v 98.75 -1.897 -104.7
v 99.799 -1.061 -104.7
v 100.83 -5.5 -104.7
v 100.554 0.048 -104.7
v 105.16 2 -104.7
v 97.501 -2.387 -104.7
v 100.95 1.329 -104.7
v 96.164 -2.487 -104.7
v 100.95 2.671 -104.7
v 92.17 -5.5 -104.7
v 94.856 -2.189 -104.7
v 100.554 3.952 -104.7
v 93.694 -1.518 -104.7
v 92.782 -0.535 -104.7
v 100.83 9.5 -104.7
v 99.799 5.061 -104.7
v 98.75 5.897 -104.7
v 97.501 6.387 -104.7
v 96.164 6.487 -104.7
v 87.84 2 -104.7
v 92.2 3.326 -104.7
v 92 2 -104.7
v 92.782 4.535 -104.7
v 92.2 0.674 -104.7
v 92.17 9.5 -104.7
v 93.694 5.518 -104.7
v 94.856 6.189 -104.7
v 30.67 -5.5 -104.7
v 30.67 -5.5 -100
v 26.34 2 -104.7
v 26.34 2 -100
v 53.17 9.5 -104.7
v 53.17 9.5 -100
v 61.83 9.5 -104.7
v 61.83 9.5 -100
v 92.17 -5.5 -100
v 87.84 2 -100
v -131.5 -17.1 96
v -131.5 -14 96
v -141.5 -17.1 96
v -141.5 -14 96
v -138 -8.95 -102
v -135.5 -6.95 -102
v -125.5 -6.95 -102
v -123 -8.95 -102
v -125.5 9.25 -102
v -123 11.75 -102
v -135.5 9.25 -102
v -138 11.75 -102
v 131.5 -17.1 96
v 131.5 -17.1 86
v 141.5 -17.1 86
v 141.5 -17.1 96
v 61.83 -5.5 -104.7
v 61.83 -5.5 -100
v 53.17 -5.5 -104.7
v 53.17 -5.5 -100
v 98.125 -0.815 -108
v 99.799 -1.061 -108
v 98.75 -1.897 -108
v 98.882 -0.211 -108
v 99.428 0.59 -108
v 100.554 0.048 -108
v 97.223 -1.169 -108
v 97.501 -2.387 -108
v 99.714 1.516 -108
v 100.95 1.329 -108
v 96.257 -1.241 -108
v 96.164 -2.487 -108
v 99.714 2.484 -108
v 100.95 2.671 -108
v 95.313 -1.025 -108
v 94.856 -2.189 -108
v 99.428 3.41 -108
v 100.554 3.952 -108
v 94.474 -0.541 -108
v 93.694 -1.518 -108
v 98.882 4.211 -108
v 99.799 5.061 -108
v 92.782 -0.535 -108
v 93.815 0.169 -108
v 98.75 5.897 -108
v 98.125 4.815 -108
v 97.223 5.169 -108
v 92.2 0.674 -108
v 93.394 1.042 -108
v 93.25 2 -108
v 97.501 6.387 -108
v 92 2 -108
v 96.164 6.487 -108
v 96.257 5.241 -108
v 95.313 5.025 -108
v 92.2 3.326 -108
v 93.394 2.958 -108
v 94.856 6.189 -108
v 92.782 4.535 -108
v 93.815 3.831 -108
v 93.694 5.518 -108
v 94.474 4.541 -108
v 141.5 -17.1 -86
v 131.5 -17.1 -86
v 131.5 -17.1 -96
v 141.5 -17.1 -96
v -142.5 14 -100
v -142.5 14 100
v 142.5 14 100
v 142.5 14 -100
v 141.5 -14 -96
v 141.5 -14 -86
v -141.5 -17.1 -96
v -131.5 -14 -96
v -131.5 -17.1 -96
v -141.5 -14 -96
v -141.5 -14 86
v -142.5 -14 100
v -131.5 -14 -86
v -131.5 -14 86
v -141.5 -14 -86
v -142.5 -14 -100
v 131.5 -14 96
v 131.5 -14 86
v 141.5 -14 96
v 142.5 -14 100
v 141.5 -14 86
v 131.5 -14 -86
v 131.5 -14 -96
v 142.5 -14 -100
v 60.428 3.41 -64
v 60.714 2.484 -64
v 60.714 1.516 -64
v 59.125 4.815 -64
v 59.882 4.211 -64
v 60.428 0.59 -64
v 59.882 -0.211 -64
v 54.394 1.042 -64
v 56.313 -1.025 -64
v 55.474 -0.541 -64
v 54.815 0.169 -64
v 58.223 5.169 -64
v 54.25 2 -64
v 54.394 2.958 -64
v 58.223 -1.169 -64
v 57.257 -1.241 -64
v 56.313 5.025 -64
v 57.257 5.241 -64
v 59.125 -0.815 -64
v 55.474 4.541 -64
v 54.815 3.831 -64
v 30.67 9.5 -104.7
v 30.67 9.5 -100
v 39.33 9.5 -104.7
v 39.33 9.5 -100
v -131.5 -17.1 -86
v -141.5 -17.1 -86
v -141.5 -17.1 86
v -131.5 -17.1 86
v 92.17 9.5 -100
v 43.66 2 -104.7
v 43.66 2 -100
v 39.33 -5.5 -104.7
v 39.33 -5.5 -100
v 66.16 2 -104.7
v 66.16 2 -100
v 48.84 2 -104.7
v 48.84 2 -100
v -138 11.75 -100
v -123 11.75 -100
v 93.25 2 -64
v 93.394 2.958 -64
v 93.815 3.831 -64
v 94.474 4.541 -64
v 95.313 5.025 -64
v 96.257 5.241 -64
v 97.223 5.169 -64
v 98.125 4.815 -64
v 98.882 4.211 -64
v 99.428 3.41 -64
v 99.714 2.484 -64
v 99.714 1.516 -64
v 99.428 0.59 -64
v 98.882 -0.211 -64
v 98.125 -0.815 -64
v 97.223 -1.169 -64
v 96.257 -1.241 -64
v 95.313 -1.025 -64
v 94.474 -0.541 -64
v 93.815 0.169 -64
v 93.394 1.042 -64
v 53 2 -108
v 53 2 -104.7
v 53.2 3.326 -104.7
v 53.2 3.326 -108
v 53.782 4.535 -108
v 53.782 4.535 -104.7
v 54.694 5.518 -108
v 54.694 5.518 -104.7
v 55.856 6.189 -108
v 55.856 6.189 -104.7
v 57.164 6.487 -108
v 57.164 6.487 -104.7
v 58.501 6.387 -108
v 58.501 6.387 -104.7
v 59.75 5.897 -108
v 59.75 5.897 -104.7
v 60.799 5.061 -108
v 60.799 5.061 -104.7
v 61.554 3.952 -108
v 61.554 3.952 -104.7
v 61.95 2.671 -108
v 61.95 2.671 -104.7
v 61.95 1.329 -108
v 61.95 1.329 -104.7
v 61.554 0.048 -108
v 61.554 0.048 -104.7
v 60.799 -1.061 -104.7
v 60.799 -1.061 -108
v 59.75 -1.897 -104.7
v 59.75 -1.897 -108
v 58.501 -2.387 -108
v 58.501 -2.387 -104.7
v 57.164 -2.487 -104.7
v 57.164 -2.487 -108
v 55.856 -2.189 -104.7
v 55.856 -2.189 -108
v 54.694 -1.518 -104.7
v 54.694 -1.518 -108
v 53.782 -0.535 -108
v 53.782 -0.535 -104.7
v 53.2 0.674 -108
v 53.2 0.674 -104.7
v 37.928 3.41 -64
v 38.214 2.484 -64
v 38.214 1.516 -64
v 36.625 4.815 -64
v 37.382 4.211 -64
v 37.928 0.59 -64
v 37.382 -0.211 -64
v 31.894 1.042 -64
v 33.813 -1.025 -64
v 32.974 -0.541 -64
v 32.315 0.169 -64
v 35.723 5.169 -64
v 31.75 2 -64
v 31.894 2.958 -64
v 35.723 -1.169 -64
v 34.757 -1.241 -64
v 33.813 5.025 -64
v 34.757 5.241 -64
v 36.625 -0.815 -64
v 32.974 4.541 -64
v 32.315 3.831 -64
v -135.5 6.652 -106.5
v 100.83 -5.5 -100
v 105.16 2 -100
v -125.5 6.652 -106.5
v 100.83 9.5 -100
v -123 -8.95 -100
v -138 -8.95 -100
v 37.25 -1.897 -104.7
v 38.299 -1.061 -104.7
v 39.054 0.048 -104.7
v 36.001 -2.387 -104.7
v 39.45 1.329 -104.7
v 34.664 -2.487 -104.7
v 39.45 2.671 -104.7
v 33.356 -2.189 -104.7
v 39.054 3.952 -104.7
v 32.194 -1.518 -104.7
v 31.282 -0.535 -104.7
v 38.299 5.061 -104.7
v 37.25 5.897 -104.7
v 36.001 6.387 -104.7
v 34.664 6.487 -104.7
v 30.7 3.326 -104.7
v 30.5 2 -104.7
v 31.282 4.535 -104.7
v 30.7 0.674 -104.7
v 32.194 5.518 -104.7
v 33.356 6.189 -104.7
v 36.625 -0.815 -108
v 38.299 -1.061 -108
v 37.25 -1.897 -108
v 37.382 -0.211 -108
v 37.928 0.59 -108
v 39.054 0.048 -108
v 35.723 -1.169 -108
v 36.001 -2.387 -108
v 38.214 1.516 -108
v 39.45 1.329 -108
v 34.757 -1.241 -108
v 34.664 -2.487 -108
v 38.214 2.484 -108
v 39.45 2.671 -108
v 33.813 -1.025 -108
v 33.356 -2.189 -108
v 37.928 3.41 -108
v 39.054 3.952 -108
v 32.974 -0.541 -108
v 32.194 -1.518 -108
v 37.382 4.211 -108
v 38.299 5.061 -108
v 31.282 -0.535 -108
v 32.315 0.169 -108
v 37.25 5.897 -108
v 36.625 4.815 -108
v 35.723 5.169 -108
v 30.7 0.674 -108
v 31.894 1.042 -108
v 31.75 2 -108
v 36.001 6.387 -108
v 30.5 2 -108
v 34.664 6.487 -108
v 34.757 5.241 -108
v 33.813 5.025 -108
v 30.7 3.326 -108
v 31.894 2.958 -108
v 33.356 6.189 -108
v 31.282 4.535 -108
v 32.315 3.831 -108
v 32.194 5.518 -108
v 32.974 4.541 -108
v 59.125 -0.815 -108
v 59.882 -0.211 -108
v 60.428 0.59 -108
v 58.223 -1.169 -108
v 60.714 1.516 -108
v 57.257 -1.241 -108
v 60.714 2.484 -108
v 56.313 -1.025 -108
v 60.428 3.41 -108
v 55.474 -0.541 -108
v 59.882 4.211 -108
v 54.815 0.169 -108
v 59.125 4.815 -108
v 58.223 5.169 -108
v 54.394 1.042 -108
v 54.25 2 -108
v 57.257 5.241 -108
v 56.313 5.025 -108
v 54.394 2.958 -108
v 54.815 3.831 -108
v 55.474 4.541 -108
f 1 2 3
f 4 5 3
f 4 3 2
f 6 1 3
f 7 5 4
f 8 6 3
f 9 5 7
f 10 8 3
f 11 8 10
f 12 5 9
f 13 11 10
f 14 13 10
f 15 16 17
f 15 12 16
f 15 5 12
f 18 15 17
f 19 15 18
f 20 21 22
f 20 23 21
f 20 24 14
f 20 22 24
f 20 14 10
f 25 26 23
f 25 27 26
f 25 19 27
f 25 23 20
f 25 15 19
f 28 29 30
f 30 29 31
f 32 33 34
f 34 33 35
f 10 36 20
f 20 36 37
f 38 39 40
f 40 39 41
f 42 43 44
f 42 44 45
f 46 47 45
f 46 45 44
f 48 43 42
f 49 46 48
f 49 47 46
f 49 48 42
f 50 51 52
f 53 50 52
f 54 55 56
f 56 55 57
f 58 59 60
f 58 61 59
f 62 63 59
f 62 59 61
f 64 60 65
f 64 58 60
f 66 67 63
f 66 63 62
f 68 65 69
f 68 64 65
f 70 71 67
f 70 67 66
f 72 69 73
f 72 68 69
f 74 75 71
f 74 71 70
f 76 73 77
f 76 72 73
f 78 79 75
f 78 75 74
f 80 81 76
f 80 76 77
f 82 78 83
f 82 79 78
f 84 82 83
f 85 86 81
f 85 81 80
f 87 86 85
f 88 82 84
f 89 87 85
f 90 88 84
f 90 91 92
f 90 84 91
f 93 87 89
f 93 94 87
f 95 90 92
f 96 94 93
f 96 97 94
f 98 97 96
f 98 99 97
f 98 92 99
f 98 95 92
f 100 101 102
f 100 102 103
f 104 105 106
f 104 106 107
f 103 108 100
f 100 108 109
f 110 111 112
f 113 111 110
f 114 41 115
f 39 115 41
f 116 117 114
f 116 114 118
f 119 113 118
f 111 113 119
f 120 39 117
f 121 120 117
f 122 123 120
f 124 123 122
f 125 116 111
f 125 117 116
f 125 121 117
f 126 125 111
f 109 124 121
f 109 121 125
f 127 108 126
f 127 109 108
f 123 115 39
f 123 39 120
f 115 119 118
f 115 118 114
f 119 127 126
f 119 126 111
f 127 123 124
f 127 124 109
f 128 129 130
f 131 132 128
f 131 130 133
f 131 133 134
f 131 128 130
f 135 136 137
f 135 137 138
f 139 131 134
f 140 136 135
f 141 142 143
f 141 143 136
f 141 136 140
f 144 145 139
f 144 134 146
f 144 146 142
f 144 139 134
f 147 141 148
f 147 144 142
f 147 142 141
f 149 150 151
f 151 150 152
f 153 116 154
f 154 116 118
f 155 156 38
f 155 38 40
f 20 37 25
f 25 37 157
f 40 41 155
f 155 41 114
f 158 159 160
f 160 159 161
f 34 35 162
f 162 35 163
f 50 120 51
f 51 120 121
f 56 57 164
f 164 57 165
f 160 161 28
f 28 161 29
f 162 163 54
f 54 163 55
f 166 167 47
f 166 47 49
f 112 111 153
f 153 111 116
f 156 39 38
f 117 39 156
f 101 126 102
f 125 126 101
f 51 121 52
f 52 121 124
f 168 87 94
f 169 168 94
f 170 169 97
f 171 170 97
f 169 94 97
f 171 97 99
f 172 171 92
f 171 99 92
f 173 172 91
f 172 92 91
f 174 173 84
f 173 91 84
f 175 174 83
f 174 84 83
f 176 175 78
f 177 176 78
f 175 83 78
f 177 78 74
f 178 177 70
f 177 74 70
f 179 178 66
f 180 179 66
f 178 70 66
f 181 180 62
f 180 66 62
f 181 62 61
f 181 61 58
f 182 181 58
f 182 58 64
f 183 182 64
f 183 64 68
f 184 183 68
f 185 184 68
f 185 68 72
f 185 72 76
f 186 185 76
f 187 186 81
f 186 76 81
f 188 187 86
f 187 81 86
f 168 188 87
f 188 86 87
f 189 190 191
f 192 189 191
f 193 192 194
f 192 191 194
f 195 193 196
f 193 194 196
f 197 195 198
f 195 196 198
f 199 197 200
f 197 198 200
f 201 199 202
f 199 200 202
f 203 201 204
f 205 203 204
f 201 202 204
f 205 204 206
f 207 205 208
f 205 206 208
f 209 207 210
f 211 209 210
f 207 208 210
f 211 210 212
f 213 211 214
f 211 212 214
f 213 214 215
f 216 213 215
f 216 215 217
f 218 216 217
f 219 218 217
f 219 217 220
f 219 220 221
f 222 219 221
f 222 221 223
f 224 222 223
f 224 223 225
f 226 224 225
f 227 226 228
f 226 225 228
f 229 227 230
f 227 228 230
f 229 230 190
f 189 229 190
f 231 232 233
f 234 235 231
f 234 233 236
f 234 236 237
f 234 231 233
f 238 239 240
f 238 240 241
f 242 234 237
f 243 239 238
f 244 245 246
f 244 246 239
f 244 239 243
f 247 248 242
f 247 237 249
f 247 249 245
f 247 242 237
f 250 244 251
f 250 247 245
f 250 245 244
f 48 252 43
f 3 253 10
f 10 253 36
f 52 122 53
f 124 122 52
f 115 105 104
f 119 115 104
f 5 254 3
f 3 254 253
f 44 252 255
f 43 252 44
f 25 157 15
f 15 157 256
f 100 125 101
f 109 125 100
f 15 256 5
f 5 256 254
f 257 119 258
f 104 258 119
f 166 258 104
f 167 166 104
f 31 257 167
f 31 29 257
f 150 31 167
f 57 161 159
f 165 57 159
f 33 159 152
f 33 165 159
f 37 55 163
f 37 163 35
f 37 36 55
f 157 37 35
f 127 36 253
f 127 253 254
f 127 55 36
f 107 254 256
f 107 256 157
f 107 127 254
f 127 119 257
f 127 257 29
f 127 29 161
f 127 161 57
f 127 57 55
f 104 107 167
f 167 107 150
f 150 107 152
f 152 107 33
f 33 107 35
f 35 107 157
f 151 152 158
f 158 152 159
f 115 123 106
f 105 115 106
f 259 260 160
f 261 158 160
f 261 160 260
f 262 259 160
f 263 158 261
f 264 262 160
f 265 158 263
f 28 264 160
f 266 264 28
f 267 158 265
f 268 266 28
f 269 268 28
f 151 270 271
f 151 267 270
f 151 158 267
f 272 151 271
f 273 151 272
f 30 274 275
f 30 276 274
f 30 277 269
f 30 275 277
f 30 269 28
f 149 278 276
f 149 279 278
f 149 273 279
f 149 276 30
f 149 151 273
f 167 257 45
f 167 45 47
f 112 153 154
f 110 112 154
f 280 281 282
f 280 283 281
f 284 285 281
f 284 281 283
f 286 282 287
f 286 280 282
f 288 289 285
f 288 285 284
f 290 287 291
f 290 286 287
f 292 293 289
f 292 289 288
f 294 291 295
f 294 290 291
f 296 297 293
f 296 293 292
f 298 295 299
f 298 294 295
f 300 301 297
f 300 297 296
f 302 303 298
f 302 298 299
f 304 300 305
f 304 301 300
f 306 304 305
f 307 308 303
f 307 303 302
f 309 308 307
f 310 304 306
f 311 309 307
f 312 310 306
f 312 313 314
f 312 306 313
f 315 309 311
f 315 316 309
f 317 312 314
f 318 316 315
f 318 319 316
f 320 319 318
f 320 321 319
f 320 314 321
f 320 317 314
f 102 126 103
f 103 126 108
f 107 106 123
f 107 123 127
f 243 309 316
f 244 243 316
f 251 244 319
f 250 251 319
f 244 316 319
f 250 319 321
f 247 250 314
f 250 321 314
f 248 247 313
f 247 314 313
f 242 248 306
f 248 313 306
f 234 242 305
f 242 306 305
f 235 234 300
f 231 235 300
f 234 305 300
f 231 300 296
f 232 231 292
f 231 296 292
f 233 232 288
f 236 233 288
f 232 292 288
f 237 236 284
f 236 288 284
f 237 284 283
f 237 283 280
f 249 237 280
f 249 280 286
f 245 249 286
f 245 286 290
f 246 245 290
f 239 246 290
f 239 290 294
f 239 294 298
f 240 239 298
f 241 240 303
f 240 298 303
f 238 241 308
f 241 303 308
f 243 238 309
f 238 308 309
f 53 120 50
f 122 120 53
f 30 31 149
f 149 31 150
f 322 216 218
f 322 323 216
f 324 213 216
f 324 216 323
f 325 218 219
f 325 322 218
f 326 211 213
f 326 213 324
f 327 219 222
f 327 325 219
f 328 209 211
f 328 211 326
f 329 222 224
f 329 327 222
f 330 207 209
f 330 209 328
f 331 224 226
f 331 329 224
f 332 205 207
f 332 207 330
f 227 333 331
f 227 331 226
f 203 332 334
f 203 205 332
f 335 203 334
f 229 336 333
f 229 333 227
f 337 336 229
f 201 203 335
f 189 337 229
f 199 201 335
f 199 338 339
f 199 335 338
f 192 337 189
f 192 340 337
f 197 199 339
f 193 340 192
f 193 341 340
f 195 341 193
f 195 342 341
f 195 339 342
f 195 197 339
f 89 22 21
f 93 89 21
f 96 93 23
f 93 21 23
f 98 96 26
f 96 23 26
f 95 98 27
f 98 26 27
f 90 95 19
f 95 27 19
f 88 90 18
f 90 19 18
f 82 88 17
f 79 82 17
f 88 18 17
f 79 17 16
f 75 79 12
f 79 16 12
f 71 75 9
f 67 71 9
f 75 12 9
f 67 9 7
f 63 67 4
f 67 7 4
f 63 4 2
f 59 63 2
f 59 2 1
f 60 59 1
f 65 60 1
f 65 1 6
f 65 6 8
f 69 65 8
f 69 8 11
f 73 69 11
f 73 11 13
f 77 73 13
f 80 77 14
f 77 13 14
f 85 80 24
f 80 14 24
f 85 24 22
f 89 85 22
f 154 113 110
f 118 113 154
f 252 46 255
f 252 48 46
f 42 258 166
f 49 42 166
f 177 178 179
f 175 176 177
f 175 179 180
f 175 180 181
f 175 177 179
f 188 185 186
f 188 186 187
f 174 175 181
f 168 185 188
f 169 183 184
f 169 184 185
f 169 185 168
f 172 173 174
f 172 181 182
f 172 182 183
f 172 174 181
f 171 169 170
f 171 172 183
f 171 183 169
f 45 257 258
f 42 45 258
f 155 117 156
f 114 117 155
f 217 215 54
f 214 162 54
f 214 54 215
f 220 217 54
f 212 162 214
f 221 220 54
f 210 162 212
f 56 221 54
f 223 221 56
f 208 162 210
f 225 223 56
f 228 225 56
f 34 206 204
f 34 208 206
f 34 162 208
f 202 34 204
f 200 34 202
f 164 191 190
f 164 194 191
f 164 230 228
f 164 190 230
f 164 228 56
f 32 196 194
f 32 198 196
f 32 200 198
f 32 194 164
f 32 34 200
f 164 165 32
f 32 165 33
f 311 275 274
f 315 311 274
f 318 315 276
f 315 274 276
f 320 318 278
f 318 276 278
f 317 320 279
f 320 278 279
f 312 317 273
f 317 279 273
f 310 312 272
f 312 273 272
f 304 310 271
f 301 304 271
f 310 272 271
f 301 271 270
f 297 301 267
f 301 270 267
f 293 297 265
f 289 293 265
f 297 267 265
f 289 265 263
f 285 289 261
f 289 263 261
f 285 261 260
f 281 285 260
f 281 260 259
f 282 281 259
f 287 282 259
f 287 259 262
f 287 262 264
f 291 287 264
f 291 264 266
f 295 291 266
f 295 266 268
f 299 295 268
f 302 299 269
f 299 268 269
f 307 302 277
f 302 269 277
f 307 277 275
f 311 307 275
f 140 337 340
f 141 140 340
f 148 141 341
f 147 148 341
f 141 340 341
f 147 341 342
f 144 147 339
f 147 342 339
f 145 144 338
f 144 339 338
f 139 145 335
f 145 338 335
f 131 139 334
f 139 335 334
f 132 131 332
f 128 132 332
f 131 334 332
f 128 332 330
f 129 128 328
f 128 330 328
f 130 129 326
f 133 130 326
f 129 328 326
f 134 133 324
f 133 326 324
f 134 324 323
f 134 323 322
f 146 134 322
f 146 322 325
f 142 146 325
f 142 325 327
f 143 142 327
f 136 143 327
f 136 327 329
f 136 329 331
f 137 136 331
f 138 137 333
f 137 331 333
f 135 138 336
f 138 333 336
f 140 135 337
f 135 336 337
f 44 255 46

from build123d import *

# Parameters (mm, degrees)
SKIZZE1_W                       = 200
SKIZZE1_H                       = 28
AUFSATZ_LINEAR_AUSTRAGEN1_DEPTH = 142.5
SKIZZE2_W                       = 15
SKIZZE2_H                       = 20.7
AUFSATZ_LINEAR_AUSTRAGEN2_DEPTH = 2
AUFSATZ_LINEAR_AUSTRAGEN3_DEPTH = 5
AUFSATZ_LINEAR_AUSTRAGEN4_DEPTH = 4.7
SKIZZE6_R                       = 4.5
AUFSATZ_LINEAR_AUSTRAGEN5_DEPTH = 3.3
SKIZZE7_R                       = 3.25
SCHNITT_LINEAR_AUSTRAGEN1_DEPTH = 44
SKIZZE8_W                       = 10
SKIZZE8_H                       = 10
AUFSATZ_LINEAR_AUSTRAGEN6_DEPTH = 3.1
SPIEGELN2_COPY_1_SKETCH_W       = 10
SPIEGELN2_COPY_1_SKETCH_H       = 10
SPIEGELN2_COPY_1_DEPTH          = 3.1


with BuildPart() as part:
    # Skizze1 → Aufsatz-Linear austragen1 (new, symmetric)
    with BuildSketch(Plane(origin=(0, 0, 0), x_dir=(0, 0, -1), z_dir=(1, 0, 0))):
        Rectangle(SKIZZE1_W, SKIZZE1_H)
    extrude(amount=AUFSATZ_LINEAR_AUSTRAGEN1_DEPTH, both=True)

    # Skizze2 → Aufsatz-Linear austragen2 (add)
    with BuildSketch(Plane(origin=(0, 0, -100), x_dir=(-1, 0, 0), z_dir=(0, 0, -1))):
        with Locations((130.5, 1.4)):
            Rectangle(SKIZZE2_W, SKIZZE2_H)
    extrude(amount=AUFSATZ_LINEAR_AUSTRAGEN2_DEPTH)

    # Skizze3 → Aufsatz-Linear austragen3 (add, symmetric)
    with BuildSketch(Plane.ZY.offset(130.5)):
        Polygon((-102, 9.25), (-106.5, 6.651923789), (-102, -6.95), align=None)
    extrude(amount=AUFSATZ_LINEAR_AUSTRAGEN3_DEPTH, both=True)

    # Skizze5 → Aufsatz-Linear austragen4 (add)
    with BuildSketch(Plane(origin=(0, 0, -100), x_dir=(-1, 0, 0), z_dir=(0, 0, -1))):
        Polygon((-100.830127019, -5.5), (-92.169872981, -5.5), (-87.839745962, 2), (-92.169872981, 9.5), (-100.830127019, 9.5), (-105.160254038, 2), align=None)
    aufsatz_linear_austragen4 = extrude(amount=AUFSATZ_LINEAR_AUSTRAGEN4_DEPTH)

    # Skizze6 → Aufsatz-Linear austragen5 (add)
    with BuildSketch(Plane(origin=(0, 0, -104.7), x_dir=(-1, 0, 0), z_dir=(0, 0, -1))):
        with Locations((-96.5, 2)):
            Circle(SKIZZE6_R)
    aufsatz_linear_austragen5 = extrude(amount=AUFSATZ_LINEAR_AUSTRAGEN5_DEPTH)

    # Skizze7 → Schnitt-Linear austragen1 (cut)
    with BuildSketch(Plane(origin=(0, 0, -108), x_dir=(-1, 0, 0), z_dir=(0, 0, -1))):
        with Locations((-96.5, 2)):
            Circle(SKIZZE7_R)
    schnitt_linear_austragen1 = extrude(amount=-SCHNITT_LINEAR_AUSTRAGEN1_DEPTH, mode=Mode.SUBTRACT)

    # Skizzen-Muster1: Aufsatz-Linear austragen4, Aufsatz-Linear austragen5, Schnitt-Linear austragen1 at 2 more places
    with Locations((-39, 0, 0), (-61.5, 0, 0)):
        add(aufsatz_linear_austragen4)
        add(aufsatz_linear_austragen5)
        add(schnitt_linear_austragen1, mode=Mode.SUBTRACT)

    # Skizze8 → Aufsatz-Linear austragen6 (add)
    with BuildSketch(Plane.XZ.offset(14)):
        with Locations((136.5, -91)):
            Rectangle(SKIZZE8_W, SKIZZE8_H)
    aufsatz_linear_austragen6 = extrude(amount=AUFSATZ_LINEAR_AUSTRAGEN6_DEPTH)

    # Spiegeln1: Aufsatz-Linear austragen6 across plane
    add(aufsatz_linear_austragen6.mirror(Plane(origin=(0, 0, 0), x_dir=(0, 0, 1), z_dir=(1, 0, 0))))

    # Spiegeln2: Aufsatz-Linear austragen6 across plane
    add(aufsatz_linear_austragen6.mirror(Plane.XY))

    # Spiegeln2 copy 1 sketch → Spiegeln2 copy 1 (add)
    with BuildSketch(Plane(origin=(0, -14, 0), x_dir=(-1, 0, 0), z_dir=(0, -1, 0))):
        with Locations((136.5, -91)):
            Rectangle(SPIEGELN2_COPY_1_SKETCH_W, SPIEGELN2_COPY_1_SKETCH_H)
    extrude(amount=SPIEGELN2_COPY_1_DEPTH)


solid = part.part
